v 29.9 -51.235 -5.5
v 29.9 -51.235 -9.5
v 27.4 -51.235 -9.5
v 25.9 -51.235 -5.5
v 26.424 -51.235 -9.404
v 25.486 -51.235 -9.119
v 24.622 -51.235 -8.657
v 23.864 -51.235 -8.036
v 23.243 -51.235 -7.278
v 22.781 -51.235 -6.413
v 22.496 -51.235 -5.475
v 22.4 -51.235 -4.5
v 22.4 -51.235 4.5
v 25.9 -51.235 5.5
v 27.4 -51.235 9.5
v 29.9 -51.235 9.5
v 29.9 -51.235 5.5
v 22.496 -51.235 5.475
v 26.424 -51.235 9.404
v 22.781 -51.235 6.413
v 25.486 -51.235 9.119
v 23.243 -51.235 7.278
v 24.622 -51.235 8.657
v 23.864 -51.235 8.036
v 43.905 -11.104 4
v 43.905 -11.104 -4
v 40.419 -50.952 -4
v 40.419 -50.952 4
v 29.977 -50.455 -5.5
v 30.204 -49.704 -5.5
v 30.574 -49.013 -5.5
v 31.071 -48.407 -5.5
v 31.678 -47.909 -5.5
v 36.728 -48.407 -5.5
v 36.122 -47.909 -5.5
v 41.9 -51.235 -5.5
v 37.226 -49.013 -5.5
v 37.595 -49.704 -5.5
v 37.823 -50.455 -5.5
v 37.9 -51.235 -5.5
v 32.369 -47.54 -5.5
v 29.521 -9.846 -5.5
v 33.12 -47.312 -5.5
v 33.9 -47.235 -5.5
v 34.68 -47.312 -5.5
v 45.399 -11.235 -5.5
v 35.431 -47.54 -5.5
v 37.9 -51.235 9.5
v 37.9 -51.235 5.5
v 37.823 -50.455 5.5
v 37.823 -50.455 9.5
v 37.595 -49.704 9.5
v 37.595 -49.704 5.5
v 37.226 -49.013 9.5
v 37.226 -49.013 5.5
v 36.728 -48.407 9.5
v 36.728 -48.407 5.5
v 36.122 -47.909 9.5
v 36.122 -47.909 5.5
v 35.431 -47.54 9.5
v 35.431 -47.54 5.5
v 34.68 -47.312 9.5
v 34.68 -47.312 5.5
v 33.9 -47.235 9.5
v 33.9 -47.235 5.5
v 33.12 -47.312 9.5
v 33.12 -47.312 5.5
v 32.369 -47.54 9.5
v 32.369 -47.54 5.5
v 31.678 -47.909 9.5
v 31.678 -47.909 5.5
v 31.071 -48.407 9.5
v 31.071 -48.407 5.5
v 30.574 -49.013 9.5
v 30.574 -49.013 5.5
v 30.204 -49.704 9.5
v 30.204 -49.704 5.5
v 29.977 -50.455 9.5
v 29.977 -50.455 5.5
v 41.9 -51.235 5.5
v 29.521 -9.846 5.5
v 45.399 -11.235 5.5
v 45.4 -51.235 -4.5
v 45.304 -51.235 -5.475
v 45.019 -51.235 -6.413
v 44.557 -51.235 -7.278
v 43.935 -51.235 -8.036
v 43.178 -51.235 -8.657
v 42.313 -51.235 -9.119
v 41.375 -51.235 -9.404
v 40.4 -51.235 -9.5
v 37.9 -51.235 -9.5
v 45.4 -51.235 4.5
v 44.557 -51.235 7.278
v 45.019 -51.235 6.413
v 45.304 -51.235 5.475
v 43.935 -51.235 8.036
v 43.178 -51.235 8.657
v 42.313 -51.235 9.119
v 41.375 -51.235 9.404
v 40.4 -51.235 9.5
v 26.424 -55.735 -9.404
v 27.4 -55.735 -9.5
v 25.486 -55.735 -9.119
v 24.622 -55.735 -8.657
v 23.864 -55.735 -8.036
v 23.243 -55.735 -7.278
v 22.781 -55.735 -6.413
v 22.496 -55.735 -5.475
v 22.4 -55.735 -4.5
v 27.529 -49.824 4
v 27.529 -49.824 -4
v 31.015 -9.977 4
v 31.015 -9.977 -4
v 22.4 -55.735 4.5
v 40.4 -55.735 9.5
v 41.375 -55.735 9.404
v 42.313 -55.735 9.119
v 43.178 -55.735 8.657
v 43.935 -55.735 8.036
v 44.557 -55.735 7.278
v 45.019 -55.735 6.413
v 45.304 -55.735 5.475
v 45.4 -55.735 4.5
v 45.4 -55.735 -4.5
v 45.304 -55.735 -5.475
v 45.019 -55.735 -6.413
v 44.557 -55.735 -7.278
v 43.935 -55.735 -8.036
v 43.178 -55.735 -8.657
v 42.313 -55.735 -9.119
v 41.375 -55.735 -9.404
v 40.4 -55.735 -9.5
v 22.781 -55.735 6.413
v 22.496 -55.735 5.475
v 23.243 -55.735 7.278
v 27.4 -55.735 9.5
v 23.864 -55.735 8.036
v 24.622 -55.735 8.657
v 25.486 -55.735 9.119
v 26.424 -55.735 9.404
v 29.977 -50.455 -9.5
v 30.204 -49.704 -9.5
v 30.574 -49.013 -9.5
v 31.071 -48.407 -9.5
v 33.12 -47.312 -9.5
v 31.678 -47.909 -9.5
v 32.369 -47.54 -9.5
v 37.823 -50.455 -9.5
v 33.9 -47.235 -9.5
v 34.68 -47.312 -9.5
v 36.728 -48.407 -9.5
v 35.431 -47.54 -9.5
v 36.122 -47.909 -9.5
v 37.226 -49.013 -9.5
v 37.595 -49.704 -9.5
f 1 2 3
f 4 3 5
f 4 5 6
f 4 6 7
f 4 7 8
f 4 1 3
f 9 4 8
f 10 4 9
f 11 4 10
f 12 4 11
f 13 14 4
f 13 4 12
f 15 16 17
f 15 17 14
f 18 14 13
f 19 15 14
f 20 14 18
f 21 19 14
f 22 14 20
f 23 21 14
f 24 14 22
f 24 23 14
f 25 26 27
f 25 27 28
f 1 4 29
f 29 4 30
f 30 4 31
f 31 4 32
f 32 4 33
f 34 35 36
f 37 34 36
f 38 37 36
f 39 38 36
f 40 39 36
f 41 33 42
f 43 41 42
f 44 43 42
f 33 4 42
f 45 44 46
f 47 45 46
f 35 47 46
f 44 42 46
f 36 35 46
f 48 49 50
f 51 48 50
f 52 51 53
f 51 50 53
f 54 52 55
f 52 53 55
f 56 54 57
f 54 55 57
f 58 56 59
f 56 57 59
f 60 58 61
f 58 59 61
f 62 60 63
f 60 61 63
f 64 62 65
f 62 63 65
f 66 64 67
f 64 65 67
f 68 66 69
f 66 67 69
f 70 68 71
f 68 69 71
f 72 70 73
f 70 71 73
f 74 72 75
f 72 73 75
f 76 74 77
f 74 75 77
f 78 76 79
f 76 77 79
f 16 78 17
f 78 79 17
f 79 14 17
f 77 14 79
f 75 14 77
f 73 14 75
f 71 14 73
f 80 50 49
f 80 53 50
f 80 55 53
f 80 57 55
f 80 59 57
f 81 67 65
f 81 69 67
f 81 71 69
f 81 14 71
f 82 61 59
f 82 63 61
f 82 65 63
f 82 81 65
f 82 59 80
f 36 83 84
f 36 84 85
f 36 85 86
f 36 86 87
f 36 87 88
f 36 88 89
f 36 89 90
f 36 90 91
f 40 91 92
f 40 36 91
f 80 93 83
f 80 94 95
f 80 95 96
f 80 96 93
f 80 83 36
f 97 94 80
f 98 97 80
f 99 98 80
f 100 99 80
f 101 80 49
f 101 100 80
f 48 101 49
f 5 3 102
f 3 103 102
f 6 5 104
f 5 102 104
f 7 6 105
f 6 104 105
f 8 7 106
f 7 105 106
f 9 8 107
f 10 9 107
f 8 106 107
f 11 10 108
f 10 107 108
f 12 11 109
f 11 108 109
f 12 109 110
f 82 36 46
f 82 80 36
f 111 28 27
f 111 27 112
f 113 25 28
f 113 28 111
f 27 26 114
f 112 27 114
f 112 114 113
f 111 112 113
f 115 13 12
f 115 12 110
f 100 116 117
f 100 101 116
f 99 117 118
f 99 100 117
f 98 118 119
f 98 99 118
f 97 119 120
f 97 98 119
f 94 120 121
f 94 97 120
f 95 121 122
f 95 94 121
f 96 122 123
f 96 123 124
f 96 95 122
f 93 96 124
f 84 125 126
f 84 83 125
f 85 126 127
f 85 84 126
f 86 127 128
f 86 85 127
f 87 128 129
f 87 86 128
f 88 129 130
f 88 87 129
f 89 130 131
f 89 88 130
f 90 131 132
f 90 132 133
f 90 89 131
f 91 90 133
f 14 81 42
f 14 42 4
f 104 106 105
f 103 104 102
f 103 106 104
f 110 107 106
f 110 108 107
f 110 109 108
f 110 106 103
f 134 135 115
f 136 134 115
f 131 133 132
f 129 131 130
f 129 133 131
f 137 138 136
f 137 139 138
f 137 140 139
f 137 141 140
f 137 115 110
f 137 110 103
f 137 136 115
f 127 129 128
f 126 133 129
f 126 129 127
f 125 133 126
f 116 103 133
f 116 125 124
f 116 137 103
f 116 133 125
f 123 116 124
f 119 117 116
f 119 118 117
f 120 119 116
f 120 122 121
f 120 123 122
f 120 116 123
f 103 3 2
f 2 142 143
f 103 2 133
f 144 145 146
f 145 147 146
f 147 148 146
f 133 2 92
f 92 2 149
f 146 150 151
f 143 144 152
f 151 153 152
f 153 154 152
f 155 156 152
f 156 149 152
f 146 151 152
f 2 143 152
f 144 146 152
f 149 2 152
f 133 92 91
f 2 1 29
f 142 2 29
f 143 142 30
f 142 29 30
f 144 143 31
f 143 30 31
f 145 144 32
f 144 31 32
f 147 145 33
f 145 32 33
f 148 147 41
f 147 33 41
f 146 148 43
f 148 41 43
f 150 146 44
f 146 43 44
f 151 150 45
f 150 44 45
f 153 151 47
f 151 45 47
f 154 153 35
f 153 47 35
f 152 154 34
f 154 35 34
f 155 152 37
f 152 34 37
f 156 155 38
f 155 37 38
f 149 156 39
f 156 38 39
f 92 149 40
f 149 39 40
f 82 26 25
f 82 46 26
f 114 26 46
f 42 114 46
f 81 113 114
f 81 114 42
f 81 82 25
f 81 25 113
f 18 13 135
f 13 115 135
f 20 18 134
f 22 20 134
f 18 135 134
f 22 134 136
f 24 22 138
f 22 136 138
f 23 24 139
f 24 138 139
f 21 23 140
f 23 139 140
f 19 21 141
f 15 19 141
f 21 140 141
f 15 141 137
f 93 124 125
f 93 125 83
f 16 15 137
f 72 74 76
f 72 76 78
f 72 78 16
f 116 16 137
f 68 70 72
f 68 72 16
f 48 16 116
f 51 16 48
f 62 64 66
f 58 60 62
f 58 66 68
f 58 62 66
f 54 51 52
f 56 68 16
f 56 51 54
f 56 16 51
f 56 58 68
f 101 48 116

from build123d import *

# Parameters (mm, degrees)
F1_DEPTH  = 5.5
F2_DEPTH  = 9.5
F5_DEPTH  = 4
F7_DEPTH  = 4
F8_R      = 5
F9_R      = 5
F10_R     = 5
F11_R     = 5
F3_W      = 12.9391151695
F3_H      = 8
F12_DEPTH = 40


# Not quite as in the source:
# - a feature names something its author has since deleted; it is built from what else it names


with BuildPart() as f1:
    # F0 (on Top) → F1 (new body, symmetric)
    with BuildSketch(Plane.XY):
        Polygon((45.3994634662, -11.2350502836), (29.5210014421, -9.8458648622), (25.8999169252, -51.2350502836), (41.8999169252, -51.2350502836), align=None)
    extrude(amount=F1_DEPTH, both=True)

    # F0 (on Top) → F2 (join, symmetric)
    with BuildSketch(Plane.XY):
        Polygon((41.8999169252, -51.2350502836), (25.8999169252, -51.2350502836), (22.3999169252, -51.2350502836), (22.3999169252, -55.7350502836), (45.3999169252, -55.7350502836), (45.3999169252, -51.2350502836), align=None)
    extrude(amount=F2_DEPTH, both=True)

    # F4 (on face) → F5 (join)
    with BuildSketch(Plane.XY.offset(5.5)):
        with BuildLine():
            Line((29.8999169252, -51.2350502836), (37.8999169252, -51.2350502836))
            ThreePointArc((37.8999169252, -51.2350502836), (33.8999169252, -47.2350502836), (29.8999169252, -51.2350502836))
        make_face()
    extrude(amount=F5_DEPTH)

    # F6 (on face) → F7 (join)
    with BuildSketch(Plane(origin=(0, 0, -5.5), x_dir=(1, 0, 0), z_dir=(0, 0, -1))):
        with BuildLine():
            ThreePointArc((29.8999169252, 51.2350502836), (33.8999169252, 47.2350502836), (37.8999169252, 51.2350502836))
            Line((37.8999169252, 51.2350502836), (29.8999169252, 51.2350502836))
        make_face()
    extrude(amount=F7_DEPTH)

    # F8
    f8_edges = [f1.edges().sort_by_distance(p)[0] for p in [
        (22.399917, -53.48505, 9.5),
    ]]
    fillet(f8_edges, radius=F8_R)

    # F9
    f9_edges = [f1.edges().sort_by_distance(p)[0] for p in [
        (45.399917, -53.48505, 9.5),
    ]]
    fillet(f9_edges, radius=F9_R)

    # F10
    f10_edges = [f1.edges().sort_by_distance(p)[0] for p in [
        (45.399917, -53.48505, -9.5),
    ]]
    fillet(f10_edges, radius=F10_R)

    # F11
    f11_edges = [f1.edges().sort_by_distance(p)[0] for p in [
        (22.399917, -53.48505, -9.5),
    ]]
    fillet(f11_edges, radius=F11_R)

    # F3 (on face) → F12 (cut)
    with BuildSketch(Plane(origin=(-0.6306130728, -7.2079404052, 0), x_dir=(-0.9961946981, 0.0871557427, 0), z_dir=(0.0871557427, 0.9961946981, 0))):
        with Locations((-38.2363463688, 0)):
            Rectangle(F3_W, F3_H)
    extrude(amount=-F12_DEPTH, mode=Mode.SUBTRACT)


solid = f1.part
